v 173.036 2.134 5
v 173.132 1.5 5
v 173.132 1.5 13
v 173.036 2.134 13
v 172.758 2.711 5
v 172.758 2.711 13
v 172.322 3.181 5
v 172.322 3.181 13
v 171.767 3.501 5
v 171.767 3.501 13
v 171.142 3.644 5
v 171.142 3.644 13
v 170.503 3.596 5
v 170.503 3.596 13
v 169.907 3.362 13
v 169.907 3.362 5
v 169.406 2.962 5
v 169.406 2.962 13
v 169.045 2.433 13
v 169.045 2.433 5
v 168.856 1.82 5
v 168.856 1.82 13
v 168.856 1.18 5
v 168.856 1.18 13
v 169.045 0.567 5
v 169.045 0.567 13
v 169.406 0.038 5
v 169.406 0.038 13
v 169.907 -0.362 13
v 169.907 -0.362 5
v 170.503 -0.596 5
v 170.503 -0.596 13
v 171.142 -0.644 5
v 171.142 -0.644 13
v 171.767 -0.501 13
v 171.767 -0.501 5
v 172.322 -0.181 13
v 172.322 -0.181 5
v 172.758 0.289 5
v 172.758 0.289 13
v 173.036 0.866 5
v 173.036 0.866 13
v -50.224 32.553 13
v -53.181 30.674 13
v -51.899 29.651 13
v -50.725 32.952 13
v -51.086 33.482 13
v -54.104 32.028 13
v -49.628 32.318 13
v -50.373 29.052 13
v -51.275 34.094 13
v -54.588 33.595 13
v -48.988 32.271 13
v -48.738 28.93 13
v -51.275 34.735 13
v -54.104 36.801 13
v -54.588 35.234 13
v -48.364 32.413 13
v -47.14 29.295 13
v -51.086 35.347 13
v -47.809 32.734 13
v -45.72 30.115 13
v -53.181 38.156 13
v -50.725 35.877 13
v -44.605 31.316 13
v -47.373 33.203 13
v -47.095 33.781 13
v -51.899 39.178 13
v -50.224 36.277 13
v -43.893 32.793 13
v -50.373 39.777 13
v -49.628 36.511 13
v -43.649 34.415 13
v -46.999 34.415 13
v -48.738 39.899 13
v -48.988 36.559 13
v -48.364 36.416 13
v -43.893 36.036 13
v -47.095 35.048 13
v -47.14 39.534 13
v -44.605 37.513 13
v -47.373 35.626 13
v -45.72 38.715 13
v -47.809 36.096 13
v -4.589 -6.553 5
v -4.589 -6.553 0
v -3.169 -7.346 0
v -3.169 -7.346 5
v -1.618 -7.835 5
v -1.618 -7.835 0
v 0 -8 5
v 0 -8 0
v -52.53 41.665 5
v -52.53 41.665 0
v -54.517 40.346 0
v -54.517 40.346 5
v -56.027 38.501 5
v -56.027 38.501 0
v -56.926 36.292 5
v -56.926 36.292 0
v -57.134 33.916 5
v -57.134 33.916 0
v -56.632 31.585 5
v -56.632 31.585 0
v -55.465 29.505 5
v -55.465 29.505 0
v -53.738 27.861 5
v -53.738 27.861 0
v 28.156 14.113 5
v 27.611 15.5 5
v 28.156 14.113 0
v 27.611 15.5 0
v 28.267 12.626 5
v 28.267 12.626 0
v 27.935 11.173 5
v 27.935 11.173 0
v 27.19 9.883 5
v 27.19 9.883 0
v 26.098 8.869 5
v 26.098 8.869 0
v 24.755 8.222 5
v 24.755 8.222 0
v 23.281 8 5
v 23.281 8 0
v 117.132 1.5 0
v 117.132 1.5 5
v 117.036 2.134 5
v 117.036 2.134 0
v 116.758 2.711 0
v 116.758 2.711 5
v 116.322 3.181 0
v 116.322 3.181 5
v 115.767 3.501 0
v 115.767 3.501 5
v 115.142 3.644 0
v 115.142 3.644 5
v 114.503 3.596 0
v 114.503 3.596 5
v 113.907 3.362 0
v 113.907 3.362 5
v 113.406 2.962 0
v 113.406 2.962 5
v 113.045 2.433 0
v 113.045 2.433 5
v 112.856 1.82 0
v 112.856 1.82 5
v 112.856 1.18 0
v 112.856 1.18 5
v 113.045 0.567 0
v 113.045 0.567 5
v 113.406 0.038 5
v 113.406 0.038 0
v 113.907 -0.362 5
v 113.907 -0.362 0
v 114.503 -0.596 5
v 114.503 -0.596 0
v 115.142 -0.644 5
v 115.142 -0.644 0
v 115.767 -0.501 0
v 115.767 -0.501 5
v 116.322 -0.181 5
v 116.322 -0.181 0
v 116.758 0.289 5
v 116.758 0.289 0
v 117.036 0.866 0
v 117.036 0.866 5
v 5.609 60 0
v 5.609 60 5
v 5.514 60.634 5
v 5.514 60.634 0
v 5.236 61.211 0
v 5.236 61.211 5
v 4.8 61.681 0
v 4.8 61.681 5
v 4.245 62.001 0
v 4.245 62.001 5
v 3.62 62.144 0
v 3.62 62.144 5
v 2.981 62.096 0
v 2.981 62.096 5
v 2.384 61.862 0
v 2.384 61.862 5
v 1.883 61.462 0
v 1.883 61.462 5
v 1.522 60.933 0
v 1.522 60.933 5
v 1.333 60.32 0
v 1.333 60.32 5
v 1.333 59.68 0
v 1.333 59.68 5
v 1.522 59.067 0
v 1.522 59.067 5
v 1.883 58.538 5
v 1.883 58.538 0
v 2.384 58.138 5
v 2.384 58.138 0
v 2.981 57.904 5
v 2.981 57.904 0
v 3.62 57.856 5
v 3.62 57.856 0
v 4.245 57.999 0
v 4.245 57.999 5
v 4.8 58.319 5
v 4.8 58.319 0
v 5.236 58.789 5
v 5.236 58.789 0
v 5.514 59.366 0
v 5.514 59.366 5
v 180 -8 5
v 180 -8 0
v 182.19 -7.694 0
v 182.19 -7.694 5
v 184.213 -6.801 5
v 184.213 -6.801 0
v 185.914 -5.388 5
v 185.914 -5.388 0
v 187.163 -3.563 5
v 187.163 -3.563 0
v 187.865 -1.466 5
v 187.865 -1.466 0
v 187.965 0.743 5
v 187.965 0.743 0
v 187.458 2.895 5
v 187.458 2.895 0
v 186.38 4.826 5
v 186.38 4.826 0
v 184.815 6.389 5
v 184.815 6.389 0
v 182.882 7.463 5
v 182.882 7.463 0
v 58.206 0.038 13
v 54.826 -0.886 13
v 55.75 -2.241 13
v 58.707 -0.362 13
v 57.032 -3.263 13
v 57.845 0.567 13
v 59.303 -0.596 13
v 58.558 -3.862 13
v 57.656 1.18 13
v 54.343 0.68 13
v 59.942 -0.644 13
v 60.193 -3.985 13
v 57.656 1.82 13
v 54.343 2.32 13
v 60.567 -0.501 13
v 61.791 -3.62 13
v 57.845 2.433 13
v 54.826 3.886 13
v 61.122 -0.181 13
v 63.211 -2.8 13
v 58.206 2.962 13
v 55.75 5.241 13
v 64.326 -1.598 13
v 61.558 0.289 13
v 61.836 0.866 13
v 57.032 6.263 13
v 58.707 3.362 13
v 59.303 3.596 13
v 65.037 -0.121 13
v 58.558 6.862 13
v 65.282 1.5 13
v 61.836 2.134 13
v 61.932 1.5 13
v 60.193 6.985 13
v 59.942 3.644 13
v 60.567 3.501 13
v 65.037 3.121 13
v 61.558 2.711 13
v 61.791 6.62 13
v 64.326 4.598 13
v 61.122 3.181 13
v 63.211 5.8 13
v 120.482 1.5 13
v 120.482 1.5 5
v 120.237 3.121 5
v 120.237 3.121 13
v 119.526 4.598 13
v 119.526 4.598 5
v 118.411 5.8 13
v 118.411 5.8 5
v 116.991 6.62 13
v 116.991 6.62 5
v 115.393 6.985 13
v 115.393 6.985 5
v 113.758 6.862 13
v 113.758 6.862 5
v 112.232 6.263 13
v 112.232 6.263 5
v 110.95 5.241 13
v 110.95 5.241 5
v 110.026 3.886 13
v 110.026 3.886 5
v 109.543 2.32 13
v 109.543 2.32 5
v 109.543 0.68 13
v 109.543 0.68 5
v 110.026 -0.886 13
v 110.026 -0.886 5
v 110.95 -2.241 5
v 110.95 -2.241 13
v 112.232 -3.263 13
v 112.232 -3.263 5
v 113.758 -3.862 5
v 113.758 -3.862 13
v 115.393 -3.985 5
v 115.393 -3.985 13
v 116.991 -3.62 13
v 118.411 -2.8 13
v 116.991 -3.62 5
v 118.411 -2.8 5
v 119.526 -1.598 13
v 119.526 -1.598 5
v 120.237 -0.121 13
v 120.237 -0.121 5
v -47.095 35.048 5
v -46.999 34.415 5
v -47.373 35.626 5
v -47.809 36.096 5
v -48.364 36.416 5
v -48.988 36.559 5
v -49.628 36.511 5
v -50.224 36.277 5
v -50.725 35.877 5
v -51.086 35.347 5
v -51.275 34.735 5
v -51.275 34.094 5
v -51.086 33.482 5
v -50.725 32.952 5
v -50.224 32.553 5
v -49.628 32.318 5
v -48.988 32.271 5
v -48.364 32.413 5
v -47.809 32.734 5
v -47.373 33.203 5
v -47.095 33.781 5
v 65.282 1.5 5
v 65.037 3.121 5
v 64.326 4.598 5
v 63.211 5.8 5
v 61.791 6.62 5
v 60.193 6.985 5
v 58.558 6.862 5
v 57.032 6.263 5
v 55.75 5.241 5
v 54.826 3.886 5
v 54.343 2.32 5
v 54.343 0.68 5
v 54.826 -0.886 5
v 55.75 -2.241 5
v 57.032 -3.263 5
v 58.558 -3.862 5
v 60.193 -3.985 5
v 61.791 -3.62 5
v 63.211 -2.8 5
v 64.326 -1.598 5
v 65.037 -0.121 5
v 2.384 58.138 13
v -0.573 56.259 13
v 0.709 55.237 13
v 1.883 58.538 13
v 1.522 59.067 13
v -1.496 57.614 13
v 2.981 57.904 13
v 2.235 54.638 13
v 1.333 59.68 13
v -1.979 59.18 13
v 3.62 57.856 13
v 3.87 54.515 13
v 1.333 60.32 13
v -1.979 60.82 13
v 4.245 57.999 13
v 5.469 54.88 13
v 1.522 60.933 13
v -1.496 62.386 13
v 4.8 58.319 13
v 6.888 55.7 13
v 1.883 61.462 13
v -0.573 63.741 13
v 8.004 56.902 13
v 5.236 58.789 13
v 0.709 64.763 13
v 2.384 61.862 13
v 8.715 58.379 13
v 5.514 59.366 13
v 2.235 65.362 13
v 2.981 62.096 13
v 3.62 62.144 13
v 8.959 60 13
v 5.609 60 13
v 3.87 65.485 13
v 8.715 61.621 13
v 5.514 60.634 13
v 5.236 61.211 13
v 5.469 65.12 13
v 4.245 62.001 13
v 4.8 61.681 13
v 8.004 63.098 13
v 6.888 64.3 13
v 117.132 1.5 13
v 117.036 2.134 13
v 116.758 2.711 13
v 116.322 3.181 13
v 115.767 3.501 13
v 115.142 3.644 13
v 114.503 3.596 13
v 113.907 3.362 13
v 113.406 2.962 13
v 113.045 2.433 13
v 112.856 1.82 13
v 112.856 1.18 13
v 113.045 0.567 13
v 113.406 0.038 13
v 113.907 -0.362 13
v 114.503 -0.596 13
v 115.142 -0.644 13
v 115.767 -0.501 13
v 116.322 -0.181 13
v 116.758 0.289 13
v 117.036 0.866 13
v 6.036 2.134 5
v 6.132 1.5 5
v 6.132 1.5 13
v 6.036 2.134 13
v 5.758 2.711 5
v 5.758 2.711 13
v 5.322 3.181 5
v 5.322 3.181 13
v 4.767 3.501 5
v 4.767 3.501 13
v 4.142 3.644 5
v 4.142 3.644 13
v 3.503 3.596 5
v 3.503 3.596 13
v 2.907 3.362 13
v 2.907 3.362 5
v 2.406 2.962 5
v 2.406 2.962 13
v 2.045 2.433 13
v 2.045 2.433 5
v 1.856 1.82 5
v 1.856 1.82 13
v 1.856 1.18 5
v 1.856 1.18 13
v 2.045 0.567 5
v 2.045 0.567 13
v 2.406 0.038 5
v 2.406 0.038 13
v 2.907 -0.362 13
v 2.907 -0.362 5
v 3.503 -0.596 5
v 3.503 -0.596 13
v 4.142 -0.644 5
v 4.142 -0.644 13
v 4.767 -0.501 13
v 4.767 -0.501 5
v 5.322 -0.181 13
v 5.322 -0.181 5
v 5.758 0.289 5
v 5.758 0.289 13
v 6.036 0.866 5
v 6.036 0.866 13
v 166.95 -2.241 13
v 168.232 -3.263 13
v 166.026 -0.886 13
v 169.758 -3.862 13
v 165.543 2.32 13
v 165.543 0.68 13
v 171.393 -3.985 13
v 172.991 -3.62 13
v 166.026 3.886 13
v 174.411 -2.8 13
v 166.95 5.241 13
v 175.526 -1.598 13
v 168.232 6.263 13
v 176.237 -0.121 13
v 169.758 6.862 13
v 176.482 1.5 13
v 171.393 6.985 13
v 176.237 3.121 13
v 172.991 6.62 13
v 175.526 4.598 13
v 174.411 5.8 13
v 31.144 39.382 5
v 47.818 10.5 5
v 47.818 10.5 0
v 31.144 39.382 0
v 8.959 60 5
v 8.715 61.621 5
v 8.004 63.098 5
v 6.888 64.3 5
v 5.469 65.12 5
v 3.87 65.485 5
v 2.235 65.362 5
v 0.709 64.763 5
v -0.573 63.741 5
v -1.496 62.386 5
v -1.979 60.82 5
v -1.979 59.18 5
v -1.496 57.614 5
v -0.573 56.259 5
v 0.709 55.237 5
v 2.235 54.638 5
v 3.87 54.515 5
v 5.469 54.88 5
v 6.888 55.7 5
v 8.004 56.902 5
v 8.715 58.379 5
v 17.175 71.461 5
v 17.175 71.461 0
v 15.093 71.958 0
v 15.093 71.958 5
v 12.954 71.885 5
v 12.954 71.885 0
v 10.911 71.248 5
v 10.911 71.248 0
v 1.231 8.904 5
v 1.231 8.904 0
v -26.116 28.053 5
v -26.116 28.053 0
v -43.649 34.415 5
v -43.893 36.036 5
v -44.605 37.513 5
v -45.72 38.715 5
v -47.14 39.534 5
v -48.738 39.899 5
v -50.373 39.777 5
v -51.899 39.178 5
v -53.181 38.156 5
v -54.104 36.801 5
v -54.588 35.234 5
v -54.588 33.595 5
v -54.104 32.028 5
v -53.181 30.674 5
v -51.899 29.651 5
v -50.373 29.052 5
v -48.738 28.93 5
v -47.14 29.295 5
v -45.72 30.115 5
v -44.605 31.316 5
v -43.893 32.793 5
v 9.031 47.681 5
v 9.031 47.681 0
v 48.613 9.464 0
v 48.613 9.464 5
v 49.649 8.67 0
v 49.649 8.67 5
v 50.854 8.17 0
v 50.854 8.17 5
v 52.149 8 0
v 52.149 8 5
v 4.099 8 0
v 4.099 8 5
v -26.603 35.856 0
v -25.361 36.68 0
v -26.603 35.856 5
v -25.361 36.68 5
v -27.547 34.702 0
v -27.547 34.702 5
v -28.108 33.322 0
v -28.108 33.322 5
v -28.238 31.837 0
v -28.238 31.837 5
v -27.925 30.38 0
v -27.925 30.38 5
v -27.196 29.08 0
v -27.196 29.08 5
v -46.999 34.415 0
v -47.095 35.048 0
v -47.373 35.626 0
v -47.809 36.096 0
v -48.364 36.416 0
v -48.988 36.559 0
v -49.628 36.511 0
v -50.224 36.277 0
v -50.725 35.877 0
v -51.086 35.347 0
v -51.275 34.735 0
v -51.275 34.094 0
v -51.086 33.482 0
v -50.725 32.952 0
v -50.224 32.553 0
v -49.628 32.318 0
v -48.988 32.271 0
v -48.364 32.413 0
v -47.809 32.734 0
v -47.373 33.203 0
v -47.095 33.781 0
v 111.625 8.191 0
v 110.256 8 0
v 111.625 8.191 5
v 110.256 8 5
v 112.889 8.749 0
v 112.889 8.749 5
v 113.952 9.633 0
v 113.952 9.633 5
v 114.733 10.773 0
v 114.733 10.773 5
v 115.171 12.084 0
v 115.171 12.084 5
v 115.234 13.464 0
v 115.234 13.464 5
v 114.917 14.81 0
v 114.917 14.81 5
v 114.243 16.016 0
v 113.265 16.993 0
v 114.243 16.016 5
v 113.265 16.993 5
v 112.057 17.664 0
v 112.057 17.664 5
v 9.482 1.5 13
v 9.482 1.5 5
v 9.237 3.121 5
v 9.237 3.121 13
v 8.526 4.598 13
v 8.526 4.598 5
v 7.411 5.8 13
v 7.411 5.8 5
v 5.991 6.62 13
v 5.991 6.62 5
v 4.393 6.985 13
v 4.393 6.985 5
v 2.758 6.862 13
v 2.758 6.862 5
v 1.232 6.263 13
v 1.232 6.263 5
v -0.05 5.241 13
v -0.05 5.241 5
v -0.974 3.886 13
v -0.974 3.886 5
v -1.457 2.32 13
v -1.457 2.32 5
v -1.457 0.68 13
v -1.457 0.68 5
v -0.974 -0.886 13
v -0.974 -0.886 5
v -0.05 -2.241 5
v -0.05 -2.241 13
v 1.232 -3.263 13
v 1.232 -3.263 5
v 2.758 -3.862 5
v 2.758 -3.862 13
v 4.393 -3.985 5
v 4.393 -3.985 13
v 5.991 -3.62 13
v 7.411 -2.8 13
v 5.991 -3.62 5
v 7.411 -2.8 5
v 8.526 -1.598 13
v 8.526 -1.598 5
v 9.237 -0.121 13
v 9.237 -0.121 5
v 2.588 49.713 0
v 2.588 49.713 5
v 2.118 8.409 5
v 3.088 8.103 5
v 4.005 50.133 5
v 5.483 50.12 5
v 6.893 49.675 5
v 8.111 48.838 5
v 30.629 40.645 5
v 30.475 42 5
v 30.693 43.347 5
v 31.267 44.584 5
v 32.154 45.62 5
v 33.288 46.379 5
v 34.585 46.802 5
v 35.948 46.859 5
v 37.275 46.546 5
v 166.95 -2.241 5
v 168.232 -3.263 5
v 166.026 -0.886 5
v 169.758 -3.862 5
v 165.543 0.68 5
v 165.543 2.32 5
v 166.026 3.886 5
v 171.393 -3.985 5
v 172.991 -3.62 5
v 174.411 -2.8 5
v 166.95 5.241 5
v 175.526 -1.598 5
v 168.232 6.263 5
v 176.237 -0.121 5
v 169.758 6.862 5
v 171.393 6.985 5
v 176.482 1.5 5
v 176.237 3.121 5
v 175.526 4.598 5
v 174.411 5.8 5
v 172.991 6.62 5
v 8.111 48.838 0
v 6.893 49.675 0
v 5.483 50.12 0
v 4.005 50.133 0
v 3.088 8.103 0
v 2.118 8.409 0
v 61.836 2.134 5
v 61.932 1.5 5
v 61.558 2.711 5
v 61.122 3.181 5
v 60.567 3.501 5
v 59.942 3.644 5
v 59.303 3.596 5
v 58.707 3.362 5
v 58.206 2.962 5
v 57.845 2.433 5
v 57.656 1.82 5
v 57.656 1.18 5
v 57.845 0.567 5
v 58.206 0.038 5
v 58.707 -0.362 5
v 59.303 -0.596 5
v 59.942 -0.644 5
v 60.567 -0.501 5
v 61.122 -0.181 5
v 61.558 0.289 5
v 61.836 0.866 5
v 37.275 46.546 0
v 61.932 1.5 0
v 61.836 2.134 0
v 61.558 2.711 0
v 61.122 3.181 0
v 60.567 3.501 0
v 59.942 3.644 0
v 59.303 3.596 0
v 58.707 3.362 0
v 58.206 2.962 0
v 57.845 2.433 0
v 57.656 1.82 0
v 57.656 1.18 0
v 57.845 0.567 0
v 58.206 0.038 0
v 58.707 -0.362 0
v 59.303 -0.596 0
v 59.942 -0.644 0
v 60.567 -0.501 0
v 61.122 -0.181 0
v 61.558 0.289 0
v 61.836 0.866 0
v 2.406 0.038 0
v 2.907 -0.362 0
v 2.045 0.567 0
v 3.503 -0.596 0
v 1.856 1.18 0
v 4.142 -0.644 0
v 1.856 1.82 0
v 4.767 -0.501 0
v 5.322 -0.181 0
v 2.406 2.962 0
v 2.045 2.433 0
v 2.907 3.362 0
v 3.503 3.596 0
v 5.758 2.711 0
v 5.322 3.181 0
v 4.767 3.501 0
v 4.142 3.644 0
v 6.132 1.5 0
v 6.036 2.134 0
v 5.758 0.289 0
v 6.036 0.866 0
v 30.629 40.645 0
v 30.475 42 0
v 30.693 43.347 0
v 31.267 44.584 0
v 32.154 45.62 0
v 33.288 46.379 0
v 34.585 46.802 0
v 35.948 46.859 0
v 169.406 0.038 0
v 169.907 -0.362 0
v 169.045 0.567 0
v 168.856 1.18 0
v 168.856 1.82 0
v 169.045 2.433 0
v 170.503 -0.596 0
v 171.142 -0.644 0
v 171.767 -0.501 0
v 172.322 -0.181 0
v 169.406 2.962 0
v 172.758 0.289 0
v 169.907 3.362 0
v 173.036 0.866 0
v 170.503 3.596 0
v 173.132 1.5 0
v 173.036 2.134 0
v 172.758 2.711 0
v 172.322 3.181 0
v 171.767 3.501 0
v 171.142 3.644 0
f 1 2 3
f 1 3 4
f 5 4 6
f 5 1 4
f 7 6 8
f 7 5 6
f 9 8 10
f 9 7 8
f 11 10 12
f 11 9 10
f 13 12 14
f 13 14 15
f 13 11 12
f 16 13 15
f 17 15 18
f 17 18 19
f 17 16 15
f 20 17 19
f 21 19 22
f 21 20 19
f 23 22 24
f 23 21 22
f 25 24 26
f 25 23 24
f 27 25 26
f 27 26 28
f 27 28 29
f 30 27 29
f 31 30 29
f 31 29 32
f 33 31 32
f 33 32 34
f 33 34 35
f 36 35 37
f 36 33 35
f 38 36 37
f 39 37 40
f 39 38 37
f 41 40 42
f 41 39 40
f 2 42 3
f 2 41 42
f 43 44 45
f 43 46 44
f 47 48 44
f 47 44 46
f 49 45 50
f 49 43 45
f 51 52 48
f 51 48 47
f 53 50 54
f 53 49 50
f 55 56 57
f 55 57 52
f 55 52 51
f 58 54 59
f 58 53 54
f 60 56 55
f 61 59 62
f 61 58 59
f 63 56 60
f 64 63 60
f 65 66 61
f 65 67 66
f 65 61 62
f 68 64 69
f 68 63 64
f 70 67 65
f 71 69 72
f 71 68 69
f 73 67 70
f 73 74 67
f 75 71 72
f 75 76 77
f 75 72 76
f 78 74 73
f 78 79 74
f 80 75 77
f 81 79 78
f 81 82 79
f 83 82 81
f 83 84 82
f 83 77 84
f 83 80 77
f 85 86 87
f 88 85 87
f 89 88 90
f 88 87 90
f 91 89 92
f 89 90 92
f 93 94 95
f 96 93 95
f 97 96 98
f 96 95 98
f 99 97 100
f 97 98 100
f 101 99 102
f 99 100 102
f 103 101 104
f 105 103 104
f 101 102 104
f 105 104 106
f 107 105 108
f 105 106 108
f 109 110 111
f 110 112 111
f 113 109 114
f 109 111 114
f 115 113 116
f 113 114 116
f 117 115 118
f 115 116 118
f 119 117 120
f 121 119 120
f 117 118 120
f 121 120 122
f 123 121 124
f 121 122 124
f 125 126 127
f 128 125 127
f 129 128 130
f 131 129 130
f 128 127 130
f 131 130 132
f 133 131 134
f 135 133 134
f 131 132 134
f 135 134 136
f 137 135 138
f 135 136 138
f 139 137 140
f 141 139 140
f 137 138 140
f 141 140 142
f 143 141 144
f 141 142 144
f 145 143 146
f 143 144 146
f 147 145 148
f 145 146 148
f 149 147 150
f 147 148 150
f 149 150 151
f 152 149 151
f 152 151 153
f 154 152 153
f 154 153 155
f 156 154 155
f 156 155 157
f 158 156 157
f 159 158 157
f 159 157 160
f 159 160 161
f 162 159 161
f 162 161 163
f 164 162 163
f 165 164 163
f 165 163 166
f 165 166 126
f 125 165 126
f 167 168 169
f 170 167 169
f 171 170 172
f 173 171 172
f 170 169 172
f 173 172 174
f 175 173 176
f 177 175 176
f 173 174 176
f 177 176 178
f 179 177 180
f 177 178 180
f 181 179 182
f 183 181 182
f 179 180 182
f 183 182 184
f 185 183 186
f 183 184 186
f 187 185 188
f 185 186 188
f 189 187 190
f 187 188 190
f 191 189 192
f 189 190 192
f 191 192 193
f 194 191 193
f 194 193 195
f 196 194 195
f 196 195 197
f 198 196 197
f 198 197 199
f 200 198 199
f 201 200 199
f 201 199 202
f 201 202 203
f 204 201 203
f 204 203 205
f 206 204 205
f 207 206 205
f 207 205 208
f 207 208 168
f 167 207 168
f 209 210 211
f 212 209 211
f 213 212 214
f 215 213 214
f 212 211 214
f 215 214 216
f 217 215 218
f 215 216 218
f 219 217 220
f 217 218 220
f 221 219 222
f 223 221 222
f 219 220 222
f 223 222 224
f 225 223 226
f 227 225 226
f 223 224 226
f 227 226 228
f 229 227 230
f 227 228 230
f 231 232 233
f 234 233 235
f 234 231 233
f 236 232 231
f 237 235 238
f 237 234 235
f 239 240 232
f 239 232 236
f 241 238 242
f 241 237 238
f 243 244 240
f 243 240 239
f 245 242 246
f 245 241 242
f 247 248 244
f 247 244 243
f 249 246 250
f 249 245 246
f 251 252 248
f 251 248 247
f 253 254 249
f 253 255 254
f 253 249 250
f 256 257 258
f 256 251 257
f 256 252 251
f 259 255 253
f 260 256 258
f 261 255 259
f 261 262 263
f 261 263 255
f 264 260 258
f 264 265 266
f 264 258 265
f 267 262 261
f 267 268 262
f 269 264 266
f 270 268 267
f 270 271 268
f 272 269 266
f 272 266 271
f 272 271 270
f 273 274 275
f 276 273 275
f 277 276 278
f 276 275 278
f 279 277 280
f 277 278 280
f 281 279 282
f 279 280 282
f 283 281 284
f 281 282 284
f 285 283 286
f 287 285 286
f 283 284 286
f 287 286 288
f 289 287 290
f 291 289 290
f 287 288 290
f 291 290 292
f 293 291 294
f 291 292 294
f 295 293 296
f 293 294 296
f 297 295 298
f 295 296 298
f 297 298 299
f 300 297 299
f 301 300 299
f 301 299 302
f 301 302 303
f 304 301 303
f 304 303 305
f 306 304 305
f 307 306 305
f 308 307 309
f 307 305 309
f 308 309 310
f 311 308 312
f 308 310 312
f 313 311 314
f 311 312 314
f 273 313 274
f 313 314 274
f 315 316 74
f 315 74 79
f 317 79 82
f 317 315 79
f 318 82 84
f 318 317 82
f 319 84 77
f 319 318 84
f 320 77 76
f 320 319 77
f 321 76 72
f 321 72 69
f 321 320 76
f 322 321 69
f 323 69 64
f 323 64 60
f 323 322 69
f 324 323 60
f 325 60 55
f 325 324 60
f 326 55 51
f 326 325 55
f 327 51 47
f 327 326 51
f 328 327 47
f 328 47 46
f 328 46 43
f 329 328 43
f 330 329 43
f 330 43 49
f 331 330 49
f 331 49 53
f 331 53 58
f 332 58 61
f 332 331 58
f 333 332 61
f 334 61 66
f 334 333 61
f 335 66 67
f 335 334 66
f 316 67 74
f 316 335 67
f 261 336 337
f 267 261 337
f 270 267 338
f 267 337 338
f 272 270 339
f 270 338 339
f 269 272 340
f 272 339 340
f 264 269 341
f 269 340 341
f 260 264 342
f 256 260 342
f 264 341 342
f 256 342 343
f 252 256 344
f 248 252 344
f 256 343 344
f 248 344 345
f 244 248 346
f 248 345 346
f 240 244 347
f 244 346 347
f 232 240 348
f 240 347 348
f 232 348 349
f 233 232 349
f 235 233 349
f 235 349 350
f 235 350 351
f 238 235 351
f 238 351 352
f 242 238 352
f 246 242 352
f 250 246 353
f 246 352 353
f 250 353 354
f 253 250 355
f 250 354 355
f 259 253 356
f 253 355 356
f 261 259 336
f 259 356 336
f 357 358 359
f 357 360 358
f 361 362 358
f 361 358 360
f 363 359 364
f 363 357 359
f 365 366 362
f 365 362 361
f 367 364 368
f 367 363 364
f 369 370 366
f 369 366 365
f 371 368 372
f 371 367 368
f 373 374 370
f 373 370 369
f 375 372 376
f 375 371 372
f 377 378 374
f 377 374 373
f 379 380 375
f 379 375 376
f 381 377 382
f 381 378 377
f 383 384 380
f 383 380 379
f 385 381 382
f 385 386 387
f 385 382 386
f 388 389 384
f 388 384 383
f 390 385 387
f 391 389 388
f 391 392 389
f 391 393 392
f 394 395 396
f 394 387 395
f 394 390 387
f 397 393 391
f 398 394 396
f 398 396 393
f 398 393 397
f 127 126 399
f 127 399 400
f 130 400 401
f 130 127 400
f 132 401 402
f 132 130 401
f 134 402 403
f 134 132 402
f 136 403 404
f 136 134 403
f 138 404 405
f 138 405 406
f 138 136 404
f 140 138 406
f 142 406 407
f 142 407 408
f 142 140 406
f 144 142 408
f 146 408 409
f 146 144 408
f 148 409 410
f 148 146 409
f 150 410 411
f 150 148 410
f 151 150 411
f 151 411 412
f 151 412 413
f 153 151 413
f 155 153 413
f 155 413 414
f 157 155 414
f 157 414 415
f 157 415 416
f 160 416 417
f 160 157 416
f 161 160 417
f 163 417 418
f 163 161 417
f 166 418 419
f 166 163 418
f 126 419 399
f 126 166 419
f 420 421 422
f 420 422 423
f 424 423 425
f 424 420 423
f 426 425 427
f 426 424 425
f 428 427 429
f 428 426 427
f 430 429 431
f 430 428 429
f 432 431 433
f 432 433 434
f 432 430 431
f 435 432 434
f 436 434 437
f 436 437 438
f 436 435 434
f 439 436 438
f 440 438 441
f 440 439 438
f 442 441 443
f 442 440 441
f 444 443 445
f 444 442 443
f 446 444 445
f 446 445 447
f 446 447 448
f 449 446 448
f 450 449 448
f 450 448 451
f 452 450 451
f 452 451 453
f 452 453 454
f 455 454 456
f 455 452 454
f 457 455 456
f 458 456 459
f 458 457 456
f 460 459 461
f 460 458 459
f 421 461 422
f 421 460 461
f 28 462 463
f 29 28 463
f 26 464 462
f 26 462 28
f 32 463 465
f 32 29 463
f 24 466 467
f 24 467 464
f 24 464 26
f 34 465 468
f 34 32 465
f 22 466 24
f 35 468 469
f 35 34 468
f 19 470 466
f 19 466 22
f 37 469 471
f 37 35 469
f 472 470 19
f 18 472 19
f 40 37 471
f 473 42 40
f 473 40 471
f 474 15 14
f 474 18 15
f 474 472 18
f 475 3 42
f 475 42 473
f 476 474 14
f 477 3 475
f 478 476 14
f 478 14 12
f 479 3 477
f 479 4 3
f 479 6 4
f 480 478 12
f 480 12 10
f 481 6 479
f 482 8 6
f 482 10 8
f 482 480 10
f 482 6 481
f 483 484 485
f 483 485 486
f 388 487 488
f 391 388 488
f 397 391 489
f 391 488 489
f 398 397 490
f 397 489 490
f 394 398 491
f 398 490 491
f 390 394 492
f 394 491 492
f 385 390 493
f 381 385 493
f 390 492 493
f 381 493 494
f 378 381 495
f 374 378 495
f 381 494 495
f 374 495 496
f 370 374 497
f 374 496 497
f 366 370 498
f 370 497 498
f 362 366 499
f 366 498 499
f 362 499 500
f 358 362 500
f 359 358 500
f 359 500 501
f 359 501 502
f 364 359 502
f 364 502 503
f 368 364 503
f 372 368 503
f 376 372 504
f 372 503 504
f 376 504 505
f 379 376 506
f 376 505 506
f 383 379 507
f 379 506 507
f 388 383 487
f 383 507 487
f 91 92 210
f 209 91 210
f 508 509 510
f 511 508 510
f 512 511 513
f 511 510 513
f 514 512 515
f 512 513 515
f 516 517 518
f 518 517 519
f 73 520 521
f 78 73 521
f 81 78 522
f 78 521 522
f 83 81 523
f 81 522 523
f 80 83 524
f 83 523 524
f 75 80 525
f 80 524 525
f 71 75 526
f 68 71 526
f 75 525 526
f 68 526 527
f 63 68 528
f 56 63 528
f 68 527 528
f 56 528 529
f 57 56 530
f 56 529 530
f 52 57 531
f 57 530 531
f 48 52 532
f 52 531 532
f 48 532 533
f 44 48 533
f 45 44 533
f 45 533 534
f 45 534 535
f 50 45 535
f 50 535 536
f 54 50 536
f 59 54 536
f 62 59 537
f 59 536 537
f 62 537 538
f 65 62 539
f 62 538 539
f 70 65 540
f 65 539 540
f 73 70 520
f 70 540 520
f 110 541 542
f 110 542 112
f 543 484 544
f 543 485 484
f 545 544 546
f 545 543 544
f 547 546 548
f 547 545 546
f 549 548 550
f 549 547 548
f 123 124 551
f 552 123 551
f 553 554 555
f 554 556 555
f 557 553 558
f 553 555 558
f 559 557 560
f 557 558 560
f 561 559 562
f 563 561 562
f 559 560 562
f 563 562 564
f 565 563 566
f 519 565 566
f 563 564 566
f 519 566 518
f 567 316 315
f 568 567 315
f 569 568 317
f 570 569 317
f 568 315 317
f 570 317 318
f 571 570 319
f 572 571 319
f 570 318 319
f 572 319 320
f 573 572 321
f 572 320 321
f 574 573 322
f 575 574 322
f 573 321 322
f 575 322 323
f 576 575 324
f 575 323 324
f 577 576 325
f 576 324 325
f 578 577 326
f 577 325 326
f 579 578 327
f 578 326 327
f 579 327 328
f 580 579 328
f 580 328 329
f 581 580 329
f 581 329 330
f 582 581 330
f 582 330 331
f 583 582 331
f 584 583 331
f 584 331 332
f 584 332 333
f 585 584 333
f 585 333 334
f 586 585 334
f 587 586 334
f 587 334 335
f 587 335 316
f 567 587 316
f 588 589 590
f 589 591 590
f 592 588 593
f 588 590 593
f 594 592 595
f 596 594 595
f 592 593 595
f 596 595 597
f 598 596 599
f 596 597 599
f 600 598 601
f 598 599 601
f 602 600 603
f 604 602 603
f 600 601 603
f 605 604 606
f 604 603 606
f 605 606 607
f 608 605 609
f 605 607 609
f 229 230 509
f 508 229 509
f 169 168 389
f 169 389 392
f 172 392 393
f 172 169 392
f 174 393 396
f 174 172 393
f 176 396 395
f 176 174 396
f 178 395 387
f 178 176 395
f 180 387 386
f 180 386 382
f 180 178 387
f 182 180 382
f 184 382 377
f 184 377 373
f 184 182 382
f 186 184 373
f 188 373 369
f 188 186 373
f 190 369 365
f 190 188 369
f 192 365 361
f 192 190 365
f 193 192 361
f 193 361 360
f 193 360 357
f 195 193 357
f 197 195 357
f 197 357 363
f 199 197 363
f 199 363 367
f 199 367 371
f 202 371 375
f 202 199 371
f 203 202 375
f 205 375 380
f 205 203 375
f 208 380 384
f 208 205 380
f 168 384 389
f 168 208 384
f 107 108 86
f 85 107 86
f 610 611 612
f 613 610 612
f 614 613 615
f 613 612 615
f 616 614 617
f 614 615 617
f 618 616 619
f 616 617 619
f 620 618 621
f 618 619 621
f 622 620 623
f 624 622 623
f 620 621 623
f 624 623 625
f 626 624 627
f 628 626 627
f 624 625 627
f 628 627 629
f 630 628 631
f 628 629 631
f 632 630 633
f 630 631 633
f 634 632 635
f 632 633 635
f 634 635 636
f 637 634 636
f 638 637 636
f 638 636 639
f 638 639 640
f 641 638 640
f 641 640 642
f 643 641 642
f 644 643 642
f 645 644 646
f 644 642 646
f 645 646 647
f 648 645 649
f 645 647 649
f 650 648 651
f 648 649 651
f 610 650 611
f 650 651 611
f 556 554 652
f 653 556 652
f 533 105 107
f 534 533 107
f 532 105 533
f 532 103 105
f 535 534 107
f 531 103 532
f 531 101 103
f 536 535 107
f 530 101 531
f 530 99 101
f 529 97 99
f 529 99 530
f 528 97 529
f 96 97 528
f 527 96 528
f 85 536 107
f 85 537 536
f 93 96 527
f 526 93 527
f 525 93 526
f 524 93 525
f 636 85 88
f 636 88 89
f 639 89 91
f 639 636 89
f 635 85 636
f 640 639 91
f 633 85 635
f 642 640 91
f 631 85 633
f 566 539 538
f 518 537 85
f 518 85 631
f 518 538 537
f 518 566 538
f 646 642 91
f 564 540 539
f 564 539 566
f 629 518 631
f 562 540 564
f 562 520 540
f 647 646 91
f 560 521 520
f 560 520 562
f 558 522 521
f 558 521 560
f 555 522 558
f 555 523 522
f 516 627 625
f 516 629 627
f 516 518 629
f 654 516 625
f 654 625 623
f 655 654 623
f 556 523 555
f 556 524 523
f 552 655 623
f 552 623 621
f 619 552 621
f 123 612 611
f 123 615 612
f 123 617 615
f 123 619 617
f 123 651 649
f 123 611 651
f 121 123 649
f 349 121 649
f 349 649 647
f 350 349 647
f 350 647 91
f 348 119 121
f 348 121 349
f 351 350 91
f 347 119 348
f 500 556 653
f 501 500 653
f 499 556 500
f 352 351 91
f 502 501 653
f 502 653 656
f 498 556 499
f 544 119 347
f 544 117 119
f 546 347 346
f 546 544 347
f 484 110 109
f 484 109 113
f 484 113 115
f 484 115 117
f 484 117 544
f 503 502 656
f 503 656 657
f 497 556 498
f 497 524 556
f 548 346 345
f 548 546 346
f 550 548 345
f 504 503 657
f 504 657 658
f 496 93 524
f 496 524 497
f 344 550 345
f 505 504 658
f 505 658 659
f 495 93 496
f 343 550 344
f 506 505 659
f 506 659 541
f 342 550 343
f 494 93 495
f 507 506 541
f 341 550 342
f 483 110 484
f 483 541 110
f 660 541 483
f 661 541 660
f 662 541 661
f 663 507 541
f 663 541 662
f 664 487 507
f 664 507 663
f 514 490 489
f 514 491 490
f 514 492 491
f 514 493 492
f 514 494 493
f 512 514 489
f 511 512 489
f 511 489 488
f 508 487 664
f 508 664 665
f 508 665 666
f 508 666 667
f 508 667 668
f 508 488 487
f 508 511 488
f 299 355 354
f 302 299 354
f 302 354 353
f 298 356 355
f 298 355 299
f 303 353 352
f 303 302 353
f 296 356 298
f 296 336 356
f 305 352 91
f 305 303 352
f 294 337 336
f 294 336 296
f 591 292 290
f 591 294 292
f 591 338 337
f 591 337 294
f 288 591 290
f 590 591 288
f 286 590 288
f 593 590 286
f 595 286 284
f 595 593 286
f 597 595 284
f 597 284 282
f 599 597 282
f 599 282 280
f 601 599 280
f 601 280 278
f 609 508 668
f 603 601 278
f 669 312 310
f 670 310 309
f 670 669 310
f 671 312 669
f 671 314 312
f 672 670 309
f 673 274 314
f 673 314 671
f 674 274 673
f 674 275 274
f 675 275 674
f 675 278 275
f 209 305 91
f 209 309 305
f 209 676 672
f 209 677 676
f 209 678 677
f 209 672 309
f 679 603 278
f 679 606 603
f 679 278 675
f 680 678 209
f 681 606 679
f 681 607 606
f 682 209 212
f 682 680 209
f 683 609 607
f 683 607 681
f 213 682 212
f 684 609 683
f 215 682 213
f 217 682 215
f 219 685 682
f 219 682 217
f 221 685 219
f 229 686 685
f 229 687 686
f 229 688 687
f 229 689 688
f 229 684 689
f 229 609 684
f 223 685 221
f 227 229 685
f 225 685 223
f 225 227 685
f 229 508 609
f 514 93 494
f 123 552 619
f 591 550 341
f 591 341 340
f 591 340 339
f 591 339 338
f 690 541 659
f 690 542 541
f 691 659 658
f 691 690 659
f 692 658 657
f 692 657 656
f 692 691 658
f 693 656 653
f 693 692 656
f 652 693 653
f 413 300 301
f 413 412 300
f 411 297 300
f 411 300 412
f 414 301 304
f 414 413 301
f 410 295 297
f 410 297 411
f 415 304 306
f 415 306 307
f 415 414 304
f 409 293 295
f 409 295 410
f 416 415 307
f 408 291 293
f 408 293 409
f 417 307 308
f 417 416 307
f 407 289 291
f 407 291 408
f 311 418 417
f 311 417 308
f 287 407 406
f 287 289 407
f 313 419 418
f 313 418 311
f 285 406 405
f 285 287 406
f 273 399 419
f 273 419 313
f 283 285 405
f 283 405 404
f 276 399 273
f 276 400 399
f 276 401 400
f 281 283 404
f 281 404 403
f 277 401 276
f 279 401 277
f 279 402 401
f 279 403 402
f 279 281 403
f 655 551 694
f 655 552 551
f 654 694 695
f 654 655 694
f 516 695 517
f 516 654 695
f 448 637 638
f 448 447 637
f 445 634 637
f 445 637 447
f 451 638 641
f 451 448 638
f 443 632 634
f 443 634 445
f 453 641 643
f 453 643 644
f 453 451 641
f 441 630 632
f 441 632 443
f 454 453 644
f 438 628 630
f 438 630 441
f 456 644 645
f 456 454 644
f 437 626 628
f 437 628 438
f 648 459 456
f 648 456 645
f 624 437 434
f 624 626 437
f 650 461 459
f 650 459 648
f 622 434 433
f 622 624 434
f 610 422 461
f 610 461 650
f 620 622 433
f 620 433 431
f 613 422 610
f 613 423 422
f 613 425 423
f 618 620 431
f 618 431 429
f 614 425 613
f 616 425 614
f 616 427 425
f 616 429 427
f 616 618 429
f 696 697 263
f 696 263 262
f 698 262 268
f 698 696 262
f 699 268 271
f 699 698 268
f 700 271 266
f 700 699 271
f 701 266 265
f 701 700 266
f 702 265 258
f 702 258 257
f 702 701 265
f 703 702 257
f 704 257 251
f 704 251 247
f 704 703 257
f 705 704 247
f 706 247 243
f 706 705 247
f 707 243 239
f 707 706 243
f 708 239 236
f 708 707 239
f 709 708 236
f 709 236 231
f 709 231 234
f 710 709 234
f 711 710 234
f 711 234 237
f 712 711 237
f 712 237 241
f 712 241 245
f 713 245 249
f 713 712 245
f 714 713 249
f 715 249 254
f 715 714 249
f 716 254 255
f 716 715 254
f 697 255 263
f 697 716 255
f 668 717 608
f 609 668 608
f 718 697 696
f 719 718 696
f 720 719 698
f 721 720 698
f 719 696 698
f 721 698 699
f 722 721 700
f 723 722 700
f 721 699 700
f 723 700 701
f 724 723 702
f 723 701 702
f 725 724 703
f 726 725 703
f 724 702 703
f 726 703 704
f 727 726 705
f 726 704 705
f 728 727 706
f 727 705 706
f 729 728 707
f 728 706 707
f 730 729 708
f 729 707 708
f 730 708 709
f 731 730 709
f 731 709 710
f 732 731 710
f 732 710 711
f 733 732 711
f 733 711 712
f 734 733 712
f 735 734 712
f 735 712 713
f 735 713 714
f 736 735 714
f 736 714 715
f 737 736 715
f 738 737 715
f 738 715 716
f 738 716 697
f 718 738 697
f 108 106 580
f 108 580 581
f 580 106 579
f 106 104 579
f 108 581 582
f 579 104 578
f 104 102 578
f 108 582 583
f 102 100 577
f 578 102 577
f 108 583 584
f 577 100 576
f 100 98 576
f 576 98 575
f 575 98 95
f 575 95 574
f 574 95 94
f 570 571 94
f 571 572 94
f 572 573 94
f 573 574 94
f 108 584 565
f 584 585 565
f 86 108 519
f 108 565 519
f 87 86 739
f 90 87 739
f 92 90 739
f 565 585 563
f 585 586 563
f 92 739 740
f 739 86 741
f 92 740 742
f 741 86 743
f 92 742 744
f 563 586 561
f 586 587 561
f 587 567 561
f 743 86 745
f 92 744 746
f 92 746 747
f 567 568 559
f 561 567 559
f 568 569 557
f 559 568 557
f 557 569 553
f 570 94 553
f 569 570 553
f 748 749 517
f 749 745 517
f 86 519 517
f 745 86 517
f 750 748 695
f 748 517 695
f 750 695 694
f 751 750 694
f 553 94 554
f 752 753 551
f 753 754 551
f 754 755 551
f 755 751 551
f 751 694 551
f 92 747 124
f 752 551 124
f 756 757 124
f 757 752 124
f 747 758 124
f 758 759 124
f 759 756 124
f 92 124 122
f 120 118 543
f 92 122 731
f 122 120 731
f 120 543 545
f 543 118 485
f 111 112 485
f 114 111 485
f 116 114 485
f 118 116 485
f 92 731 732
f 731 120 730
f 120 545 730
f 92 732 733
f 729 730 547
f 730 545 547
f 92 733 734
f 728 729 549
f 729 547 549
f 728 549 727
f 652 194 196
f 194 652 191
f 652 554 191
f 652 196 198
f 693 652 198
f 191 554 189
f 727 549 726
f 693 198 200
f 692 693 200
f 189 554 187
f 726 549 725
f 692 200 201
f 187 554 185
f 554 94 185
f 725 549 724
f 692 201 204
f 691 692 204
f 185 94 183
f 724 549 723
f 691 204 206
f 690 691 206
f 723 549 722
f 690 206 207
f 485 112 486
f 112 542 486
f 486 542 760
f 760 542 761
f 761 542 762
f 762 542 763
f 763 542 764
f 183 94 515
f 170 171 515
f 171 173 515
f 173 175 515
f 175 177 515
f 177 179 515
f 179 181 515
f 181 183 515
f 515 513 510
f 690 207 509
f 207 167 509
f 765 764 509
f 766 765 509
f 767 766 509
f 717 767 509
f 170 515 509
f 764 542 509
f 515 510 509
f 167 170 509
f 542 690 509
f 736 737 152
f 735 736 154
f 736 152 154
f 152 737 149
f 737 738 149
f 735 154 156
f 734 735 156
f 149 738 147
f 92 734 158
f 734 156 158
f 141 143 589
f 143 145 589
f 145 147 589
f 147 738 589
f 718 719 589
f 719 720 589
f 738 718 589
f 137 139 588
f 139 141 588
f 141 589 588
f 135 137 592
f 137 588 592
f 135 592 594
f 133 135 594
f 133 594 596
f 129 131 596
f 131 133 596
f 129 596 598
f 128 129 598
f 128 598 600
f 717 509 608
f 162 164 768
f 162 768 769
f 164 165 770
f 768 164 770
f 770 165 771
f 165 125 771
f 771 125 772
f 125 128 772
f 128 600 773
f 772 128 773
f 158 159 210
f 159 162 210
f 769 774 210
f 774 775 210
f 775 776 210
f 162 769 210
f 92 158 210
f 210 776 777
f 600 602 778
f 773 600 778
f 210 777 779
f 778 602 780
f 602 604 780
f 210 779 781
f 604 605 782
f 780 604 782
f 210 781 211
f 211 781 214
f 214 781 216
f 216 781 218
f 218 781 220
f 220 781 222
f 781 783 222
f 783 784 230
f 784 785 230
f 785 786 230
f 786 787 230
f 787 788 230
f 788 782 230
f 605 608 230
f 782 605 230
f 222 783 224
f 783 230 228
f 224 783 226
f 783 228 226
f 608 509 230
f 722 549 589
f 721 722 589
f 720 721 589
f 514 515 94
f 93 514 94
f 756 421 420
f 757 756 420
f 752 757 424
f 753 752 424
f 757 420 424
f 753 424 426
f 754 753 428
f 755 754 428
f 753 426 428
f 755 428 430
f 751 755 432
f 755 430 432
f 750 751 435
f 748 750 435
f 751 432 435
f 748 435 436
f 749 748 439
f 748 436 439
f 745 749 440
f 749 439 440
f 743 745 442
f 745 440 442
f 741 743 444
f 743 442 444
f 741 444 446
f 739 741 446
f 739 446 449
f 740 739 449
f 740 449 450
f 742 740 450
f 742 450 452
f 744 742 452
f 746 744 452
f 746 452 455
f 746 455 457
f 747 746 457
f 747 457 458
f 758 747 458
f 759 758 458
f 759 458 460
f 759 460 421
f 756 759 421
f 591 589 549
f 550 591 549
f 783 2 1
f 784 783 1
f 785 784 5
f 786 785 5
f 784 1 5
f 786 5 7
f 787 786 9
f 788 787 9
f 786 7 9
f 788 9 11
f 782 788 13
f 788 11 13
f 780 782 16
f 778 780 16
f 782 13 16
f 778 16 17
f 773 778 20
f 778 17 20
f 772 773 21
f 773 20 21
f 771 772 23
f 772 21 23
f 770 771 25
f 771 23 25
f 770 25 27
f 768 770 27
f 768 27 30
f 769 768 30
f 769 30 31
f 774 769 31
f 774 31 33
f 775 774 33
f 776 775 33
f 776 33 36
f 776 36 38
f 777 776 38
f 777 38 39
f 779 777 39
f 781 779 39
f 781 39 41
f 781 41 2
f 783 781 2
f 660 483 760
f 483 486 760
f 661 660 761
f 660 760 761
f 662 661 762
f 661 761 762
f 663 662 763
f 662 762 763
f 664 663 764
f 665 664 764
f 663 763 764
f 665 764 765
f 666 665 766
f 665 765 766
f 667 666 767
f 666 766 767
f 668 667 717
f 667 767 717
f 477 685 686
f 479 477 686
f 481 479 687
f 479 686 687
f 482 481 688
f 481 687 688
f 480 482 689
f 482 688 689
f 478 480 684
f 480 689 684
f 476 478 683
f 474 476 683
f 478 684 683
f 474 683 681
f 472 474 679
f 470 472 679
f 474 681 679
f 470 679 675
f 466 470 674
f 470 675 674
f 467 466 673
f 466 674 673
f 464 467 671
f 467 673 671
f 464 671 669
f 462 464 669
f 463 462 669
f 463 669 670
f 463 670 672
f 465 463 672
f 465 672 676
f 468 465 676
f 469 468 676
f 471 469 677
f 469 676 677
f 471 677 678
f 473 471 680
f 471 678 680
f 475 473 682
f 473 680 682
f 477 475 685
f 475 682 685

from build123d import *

# Parameters (mm, degrees)
BOSS_EXTRUDE1_DEPTH = 5
BOSS_EXTRUDE2_DEPTH = 5
FILLET1_R           = 5
SKETCH3_R           = 5.5
SKETCH3_R_2         = 2.15
BOSS_EXTRUDE3_DEPTH = 8
SKETCH4_R           = 2.15
CUT_EXTRUDE1_DEPTH  = 6


with BuildPart() as part:
    # Sketch1 → Boss-Extrude1 (new body)
    with BuildSketch(Plane.XY):
        with BuildLine():
            Line((-44.560511167, 40.967802535), (-33.210007488, 33.020094297))
            Line((-33.210007488, 33.020094297), (14.586986289, 55.308198532))
            Line((14.586986289, 55.308198532), (11.410228171, 56.535093153))
            ThreePointArc((11.410228171, 56.535093153), (6.297014824, 63.726834744), (10.911476341, 71.248326799))
            Line((10.911476341, 71.248326799), (-52.530068751, 41.665048477))
            ThreePointArc((-52.530068751, 41.665048477), (-48.451876715, 42.384143766), (-44.560511167, 40.967802535))
        make_face()
        with BuildLine():
            Line((14.586986289, 55.308198532), (137.080557575, 8))
            Line((137.080557575, 8), (180, 8))
            ThreePointArc((180, 8), (181.465917665, 7.864546103), (182.882194265, 7.46277135))
            Line((182.882194265, 7.46277135), (17.1746167, 71.460635853))
            ThreePointArc((17.1746167, 71.460635853), (22.287830046, 64.268894262), (17.673368529, 56.747402207))
            Line((17.673368529, 56.747402207), (14.586986289, 55.308198532))
        make_face()
        with BuildLine():
            Line((137.080557575, 8), (2.522390311, 8))
            Line((2.522390311, 8), (4.588611491, 6.553216354))
            ThreePointArc((4.588611491, 6.553216354), (7.629735606, -2.405646396), (0, -8))
            Line((0, -8), (180, -8))
            ThreePointArc((180, -8), (178.534082335, -7.864546103), (177.117805735, -7.46277135))
            Line((177.117805735, -7.46277135), (137.080557575, 8))
        make_face()
        with BuildLine():
            ThreePointArc((-4.588611491, -6.553216354), (-7.629735606, 2.405646396), (0, 8))
            Line((0, 8), (2.522390311, 8))
            Line((2.522390311, 8), (-33.210007488, 33.020094297))
            Line((-33.210007488, 33.020094297), (-45.768176563, 27.164123885))
            ThreePointArc((-45.768176563, 27.164123885), (-49.846368599, 26.445028596), (-53.737734148, 27.861369827))
            Line((-53.737734148, 27.861369827), (-4.588611491, -6.553216354))
        make_face()
        with BuildLine():
            Line((180, 8), (137.080557575, 8))
            Line((137.080557575, 8), (177.117805735, -7.46277135))
            ThreePointArc((177.117805735, -7.46277135), (178.534082335, -7.864546103), (180, -8))
            ThreePointArc((180, -8), (187.864546103, -1.465917665), (182.882194265, 7.46277135))
            ThreePointArc((182.882194265, 7.46277135), (181.465917665, 7.864546103), (180, 8))
        make_face()
        with BuildLine():
            Line((11.410228171, 56.535093153), (14.586986289, 55.308198532))
            Line((14.586986289, 55.308198532), (17.673368529, 56.747402207))
            ThreePointArc((17.673368529, 56.747402207), (22.287830046, 64.268894262), (17.1746167, 71.460635853))
            ThreePointArc((17.1746167, 71.460635853), (14.021392676, 71.993272114), (10.911476341, 71.248326799))
            ThreePointArc((10.911476341, 71.248326799), (6.297014824, 63.726834744), (11.410228171, 56.535093153))
        make_face()
        with BuildLine():
            Line((-45.768176563, 27.164123885), (-33.210007488, 33.020094297))
            Line((-33.210007488, 33.020094297), (-44.560511167, 40.967802535))
            ThreePointArc((-44.560511167, 40.967802535), (-48.451876715, 42.384143766), (-52.530068751, 41.665048477))
            ThreePointArc((-52.530068751, 41.665048477), (-57.118680242, 35.111832123), (-53.737734148, 27.861369827))
            ThreePointArc((-53.737734148, 27.861369827), (-49.846368599, 26.445028596), (-45.768176563, 27.164123885))
        make_face()
        with BuildLine():
            Line((2.522390311, 8), (0, 8))
            ThreePointArc((0, 8), (-7.629735606, 2.405646396), (-4.588611491, -6.553216354))
            ThreePointArc((-4.588611491, -6.553216354), (-2.405646396, -7.629735606), (0, -8))
            ThreePointArc((0, -8), (7.629735606, -2.405646396), (4.588611491, 6.553216354))
            Line((4.588611491, 6.553216354), (2.522390311, 8))
        make_face()
    extrude(amount=BOSS_EXTRUDE1_DEPTH)

    # Sketch2 → Boss-Extrude2 (add, through all)
    with BuildSketch(Plane.XY.offset(5)):
        Polygon((14.586986289, 55.308198532), (6.740403892, 51.64927707), (31.941325759, 8), (49.261833834, 8), (24.060911968, 51.64927707), align=None)
    extrude(amount=-BOSS_EXTRUDE2_DEPTH)

    # Fillet1
    fillet1_edges = [part.edges().sort_by_distance(p)[0] for p in [
        (-33.210007488, 33.020094297, 2.5),
        (2.522390311, 8, 2.5),
        (137.080557575, 8, 2.5),
        (24.060911968, 51.64927707, 2.5),
        (49.261833834, 8, 2.5),
        (31.941325759, 8, 2.5),
        (6.740403892, 51.64927707, 2.5),
    ]]
    fillet(fillet1_edges, radius=FILLET1_R)

    # Sketch3 → Boss-Extrude3 (add)
    with BuildSketch(Plane.XY.offset(5)):
        with Locations((-49.149122657, 34.414586181)):
            Circle(SKETCH3_R)
        with Locations((-49.149122657, 34.414586181)):
            Circle(SKETCH3_R_2, mode=Mode.SUBTRACT)
        with Locations((3.981659537, 1.5)):
            Circle(SKETCH3_R)
        with Locations((3.981659537, 1.5)):
            Circle(SKETCH3_R_2, mode=Mode.SUBTRACT)
        with Locations((59.781659537, 1.5)):
            Circle(SKETCH3_R)
        with Locations((59.781659537, 1.5)):
            Circle(SKETCH3_R_2, mode=Mode.SUBTRACT)
        with Locations((114.981659537, 1.5)):
            Circle(SKETCH3_R)
        with Locations((114.981659537, 1.5)):
            Circle(SKETCH3_R_2, mode=Mode.SUBTRACT)
        with Locations((170.981659537, 1.5)):
            Circle(SKETCH3_R)
        with Locations((170.981659537, 1.5)):
            Circle(SKETCH3_R_2, mode=Mode.SUBTRACT)
        with Locations((3.45920938, 60)):
            Circle(SKETCH3_R)
        with Locations((3.45920938, 60)):
            Circle(SKETCH3_R_2, mode=Mode.SUBTRACT)
    extrude(amount=BOSS_EXTRUDE3_DEPTH)

    # Sketch4 → Cut-Extrude1 (cut, through all)
    with BuildSketch(Plane.XY.offset(5)):
        with Locations((-49.149122657, 34.414586181)):
            Circle(SKETCH4_R)
        with Locations((3.981659537, 1.5)):
            Circle(SKETCH4_R)
        with Locations((59.781659537, 1.5)):
            Circle(SKETCH4_R)
        with Locations((114.981659537, 1.5)):
            Circle(SKETCH4_R)
        with Locations((170.981659537, 1.5)):
            Circle(SKETCH4_R)
        with Locations((3.45920938, 60)):
            Circle(SKETCH4_R)
    extrude(amount=-CUT_EXTRUDE1_DEPTH, mode=Mode.SUBTRACT)


solid = part.part
